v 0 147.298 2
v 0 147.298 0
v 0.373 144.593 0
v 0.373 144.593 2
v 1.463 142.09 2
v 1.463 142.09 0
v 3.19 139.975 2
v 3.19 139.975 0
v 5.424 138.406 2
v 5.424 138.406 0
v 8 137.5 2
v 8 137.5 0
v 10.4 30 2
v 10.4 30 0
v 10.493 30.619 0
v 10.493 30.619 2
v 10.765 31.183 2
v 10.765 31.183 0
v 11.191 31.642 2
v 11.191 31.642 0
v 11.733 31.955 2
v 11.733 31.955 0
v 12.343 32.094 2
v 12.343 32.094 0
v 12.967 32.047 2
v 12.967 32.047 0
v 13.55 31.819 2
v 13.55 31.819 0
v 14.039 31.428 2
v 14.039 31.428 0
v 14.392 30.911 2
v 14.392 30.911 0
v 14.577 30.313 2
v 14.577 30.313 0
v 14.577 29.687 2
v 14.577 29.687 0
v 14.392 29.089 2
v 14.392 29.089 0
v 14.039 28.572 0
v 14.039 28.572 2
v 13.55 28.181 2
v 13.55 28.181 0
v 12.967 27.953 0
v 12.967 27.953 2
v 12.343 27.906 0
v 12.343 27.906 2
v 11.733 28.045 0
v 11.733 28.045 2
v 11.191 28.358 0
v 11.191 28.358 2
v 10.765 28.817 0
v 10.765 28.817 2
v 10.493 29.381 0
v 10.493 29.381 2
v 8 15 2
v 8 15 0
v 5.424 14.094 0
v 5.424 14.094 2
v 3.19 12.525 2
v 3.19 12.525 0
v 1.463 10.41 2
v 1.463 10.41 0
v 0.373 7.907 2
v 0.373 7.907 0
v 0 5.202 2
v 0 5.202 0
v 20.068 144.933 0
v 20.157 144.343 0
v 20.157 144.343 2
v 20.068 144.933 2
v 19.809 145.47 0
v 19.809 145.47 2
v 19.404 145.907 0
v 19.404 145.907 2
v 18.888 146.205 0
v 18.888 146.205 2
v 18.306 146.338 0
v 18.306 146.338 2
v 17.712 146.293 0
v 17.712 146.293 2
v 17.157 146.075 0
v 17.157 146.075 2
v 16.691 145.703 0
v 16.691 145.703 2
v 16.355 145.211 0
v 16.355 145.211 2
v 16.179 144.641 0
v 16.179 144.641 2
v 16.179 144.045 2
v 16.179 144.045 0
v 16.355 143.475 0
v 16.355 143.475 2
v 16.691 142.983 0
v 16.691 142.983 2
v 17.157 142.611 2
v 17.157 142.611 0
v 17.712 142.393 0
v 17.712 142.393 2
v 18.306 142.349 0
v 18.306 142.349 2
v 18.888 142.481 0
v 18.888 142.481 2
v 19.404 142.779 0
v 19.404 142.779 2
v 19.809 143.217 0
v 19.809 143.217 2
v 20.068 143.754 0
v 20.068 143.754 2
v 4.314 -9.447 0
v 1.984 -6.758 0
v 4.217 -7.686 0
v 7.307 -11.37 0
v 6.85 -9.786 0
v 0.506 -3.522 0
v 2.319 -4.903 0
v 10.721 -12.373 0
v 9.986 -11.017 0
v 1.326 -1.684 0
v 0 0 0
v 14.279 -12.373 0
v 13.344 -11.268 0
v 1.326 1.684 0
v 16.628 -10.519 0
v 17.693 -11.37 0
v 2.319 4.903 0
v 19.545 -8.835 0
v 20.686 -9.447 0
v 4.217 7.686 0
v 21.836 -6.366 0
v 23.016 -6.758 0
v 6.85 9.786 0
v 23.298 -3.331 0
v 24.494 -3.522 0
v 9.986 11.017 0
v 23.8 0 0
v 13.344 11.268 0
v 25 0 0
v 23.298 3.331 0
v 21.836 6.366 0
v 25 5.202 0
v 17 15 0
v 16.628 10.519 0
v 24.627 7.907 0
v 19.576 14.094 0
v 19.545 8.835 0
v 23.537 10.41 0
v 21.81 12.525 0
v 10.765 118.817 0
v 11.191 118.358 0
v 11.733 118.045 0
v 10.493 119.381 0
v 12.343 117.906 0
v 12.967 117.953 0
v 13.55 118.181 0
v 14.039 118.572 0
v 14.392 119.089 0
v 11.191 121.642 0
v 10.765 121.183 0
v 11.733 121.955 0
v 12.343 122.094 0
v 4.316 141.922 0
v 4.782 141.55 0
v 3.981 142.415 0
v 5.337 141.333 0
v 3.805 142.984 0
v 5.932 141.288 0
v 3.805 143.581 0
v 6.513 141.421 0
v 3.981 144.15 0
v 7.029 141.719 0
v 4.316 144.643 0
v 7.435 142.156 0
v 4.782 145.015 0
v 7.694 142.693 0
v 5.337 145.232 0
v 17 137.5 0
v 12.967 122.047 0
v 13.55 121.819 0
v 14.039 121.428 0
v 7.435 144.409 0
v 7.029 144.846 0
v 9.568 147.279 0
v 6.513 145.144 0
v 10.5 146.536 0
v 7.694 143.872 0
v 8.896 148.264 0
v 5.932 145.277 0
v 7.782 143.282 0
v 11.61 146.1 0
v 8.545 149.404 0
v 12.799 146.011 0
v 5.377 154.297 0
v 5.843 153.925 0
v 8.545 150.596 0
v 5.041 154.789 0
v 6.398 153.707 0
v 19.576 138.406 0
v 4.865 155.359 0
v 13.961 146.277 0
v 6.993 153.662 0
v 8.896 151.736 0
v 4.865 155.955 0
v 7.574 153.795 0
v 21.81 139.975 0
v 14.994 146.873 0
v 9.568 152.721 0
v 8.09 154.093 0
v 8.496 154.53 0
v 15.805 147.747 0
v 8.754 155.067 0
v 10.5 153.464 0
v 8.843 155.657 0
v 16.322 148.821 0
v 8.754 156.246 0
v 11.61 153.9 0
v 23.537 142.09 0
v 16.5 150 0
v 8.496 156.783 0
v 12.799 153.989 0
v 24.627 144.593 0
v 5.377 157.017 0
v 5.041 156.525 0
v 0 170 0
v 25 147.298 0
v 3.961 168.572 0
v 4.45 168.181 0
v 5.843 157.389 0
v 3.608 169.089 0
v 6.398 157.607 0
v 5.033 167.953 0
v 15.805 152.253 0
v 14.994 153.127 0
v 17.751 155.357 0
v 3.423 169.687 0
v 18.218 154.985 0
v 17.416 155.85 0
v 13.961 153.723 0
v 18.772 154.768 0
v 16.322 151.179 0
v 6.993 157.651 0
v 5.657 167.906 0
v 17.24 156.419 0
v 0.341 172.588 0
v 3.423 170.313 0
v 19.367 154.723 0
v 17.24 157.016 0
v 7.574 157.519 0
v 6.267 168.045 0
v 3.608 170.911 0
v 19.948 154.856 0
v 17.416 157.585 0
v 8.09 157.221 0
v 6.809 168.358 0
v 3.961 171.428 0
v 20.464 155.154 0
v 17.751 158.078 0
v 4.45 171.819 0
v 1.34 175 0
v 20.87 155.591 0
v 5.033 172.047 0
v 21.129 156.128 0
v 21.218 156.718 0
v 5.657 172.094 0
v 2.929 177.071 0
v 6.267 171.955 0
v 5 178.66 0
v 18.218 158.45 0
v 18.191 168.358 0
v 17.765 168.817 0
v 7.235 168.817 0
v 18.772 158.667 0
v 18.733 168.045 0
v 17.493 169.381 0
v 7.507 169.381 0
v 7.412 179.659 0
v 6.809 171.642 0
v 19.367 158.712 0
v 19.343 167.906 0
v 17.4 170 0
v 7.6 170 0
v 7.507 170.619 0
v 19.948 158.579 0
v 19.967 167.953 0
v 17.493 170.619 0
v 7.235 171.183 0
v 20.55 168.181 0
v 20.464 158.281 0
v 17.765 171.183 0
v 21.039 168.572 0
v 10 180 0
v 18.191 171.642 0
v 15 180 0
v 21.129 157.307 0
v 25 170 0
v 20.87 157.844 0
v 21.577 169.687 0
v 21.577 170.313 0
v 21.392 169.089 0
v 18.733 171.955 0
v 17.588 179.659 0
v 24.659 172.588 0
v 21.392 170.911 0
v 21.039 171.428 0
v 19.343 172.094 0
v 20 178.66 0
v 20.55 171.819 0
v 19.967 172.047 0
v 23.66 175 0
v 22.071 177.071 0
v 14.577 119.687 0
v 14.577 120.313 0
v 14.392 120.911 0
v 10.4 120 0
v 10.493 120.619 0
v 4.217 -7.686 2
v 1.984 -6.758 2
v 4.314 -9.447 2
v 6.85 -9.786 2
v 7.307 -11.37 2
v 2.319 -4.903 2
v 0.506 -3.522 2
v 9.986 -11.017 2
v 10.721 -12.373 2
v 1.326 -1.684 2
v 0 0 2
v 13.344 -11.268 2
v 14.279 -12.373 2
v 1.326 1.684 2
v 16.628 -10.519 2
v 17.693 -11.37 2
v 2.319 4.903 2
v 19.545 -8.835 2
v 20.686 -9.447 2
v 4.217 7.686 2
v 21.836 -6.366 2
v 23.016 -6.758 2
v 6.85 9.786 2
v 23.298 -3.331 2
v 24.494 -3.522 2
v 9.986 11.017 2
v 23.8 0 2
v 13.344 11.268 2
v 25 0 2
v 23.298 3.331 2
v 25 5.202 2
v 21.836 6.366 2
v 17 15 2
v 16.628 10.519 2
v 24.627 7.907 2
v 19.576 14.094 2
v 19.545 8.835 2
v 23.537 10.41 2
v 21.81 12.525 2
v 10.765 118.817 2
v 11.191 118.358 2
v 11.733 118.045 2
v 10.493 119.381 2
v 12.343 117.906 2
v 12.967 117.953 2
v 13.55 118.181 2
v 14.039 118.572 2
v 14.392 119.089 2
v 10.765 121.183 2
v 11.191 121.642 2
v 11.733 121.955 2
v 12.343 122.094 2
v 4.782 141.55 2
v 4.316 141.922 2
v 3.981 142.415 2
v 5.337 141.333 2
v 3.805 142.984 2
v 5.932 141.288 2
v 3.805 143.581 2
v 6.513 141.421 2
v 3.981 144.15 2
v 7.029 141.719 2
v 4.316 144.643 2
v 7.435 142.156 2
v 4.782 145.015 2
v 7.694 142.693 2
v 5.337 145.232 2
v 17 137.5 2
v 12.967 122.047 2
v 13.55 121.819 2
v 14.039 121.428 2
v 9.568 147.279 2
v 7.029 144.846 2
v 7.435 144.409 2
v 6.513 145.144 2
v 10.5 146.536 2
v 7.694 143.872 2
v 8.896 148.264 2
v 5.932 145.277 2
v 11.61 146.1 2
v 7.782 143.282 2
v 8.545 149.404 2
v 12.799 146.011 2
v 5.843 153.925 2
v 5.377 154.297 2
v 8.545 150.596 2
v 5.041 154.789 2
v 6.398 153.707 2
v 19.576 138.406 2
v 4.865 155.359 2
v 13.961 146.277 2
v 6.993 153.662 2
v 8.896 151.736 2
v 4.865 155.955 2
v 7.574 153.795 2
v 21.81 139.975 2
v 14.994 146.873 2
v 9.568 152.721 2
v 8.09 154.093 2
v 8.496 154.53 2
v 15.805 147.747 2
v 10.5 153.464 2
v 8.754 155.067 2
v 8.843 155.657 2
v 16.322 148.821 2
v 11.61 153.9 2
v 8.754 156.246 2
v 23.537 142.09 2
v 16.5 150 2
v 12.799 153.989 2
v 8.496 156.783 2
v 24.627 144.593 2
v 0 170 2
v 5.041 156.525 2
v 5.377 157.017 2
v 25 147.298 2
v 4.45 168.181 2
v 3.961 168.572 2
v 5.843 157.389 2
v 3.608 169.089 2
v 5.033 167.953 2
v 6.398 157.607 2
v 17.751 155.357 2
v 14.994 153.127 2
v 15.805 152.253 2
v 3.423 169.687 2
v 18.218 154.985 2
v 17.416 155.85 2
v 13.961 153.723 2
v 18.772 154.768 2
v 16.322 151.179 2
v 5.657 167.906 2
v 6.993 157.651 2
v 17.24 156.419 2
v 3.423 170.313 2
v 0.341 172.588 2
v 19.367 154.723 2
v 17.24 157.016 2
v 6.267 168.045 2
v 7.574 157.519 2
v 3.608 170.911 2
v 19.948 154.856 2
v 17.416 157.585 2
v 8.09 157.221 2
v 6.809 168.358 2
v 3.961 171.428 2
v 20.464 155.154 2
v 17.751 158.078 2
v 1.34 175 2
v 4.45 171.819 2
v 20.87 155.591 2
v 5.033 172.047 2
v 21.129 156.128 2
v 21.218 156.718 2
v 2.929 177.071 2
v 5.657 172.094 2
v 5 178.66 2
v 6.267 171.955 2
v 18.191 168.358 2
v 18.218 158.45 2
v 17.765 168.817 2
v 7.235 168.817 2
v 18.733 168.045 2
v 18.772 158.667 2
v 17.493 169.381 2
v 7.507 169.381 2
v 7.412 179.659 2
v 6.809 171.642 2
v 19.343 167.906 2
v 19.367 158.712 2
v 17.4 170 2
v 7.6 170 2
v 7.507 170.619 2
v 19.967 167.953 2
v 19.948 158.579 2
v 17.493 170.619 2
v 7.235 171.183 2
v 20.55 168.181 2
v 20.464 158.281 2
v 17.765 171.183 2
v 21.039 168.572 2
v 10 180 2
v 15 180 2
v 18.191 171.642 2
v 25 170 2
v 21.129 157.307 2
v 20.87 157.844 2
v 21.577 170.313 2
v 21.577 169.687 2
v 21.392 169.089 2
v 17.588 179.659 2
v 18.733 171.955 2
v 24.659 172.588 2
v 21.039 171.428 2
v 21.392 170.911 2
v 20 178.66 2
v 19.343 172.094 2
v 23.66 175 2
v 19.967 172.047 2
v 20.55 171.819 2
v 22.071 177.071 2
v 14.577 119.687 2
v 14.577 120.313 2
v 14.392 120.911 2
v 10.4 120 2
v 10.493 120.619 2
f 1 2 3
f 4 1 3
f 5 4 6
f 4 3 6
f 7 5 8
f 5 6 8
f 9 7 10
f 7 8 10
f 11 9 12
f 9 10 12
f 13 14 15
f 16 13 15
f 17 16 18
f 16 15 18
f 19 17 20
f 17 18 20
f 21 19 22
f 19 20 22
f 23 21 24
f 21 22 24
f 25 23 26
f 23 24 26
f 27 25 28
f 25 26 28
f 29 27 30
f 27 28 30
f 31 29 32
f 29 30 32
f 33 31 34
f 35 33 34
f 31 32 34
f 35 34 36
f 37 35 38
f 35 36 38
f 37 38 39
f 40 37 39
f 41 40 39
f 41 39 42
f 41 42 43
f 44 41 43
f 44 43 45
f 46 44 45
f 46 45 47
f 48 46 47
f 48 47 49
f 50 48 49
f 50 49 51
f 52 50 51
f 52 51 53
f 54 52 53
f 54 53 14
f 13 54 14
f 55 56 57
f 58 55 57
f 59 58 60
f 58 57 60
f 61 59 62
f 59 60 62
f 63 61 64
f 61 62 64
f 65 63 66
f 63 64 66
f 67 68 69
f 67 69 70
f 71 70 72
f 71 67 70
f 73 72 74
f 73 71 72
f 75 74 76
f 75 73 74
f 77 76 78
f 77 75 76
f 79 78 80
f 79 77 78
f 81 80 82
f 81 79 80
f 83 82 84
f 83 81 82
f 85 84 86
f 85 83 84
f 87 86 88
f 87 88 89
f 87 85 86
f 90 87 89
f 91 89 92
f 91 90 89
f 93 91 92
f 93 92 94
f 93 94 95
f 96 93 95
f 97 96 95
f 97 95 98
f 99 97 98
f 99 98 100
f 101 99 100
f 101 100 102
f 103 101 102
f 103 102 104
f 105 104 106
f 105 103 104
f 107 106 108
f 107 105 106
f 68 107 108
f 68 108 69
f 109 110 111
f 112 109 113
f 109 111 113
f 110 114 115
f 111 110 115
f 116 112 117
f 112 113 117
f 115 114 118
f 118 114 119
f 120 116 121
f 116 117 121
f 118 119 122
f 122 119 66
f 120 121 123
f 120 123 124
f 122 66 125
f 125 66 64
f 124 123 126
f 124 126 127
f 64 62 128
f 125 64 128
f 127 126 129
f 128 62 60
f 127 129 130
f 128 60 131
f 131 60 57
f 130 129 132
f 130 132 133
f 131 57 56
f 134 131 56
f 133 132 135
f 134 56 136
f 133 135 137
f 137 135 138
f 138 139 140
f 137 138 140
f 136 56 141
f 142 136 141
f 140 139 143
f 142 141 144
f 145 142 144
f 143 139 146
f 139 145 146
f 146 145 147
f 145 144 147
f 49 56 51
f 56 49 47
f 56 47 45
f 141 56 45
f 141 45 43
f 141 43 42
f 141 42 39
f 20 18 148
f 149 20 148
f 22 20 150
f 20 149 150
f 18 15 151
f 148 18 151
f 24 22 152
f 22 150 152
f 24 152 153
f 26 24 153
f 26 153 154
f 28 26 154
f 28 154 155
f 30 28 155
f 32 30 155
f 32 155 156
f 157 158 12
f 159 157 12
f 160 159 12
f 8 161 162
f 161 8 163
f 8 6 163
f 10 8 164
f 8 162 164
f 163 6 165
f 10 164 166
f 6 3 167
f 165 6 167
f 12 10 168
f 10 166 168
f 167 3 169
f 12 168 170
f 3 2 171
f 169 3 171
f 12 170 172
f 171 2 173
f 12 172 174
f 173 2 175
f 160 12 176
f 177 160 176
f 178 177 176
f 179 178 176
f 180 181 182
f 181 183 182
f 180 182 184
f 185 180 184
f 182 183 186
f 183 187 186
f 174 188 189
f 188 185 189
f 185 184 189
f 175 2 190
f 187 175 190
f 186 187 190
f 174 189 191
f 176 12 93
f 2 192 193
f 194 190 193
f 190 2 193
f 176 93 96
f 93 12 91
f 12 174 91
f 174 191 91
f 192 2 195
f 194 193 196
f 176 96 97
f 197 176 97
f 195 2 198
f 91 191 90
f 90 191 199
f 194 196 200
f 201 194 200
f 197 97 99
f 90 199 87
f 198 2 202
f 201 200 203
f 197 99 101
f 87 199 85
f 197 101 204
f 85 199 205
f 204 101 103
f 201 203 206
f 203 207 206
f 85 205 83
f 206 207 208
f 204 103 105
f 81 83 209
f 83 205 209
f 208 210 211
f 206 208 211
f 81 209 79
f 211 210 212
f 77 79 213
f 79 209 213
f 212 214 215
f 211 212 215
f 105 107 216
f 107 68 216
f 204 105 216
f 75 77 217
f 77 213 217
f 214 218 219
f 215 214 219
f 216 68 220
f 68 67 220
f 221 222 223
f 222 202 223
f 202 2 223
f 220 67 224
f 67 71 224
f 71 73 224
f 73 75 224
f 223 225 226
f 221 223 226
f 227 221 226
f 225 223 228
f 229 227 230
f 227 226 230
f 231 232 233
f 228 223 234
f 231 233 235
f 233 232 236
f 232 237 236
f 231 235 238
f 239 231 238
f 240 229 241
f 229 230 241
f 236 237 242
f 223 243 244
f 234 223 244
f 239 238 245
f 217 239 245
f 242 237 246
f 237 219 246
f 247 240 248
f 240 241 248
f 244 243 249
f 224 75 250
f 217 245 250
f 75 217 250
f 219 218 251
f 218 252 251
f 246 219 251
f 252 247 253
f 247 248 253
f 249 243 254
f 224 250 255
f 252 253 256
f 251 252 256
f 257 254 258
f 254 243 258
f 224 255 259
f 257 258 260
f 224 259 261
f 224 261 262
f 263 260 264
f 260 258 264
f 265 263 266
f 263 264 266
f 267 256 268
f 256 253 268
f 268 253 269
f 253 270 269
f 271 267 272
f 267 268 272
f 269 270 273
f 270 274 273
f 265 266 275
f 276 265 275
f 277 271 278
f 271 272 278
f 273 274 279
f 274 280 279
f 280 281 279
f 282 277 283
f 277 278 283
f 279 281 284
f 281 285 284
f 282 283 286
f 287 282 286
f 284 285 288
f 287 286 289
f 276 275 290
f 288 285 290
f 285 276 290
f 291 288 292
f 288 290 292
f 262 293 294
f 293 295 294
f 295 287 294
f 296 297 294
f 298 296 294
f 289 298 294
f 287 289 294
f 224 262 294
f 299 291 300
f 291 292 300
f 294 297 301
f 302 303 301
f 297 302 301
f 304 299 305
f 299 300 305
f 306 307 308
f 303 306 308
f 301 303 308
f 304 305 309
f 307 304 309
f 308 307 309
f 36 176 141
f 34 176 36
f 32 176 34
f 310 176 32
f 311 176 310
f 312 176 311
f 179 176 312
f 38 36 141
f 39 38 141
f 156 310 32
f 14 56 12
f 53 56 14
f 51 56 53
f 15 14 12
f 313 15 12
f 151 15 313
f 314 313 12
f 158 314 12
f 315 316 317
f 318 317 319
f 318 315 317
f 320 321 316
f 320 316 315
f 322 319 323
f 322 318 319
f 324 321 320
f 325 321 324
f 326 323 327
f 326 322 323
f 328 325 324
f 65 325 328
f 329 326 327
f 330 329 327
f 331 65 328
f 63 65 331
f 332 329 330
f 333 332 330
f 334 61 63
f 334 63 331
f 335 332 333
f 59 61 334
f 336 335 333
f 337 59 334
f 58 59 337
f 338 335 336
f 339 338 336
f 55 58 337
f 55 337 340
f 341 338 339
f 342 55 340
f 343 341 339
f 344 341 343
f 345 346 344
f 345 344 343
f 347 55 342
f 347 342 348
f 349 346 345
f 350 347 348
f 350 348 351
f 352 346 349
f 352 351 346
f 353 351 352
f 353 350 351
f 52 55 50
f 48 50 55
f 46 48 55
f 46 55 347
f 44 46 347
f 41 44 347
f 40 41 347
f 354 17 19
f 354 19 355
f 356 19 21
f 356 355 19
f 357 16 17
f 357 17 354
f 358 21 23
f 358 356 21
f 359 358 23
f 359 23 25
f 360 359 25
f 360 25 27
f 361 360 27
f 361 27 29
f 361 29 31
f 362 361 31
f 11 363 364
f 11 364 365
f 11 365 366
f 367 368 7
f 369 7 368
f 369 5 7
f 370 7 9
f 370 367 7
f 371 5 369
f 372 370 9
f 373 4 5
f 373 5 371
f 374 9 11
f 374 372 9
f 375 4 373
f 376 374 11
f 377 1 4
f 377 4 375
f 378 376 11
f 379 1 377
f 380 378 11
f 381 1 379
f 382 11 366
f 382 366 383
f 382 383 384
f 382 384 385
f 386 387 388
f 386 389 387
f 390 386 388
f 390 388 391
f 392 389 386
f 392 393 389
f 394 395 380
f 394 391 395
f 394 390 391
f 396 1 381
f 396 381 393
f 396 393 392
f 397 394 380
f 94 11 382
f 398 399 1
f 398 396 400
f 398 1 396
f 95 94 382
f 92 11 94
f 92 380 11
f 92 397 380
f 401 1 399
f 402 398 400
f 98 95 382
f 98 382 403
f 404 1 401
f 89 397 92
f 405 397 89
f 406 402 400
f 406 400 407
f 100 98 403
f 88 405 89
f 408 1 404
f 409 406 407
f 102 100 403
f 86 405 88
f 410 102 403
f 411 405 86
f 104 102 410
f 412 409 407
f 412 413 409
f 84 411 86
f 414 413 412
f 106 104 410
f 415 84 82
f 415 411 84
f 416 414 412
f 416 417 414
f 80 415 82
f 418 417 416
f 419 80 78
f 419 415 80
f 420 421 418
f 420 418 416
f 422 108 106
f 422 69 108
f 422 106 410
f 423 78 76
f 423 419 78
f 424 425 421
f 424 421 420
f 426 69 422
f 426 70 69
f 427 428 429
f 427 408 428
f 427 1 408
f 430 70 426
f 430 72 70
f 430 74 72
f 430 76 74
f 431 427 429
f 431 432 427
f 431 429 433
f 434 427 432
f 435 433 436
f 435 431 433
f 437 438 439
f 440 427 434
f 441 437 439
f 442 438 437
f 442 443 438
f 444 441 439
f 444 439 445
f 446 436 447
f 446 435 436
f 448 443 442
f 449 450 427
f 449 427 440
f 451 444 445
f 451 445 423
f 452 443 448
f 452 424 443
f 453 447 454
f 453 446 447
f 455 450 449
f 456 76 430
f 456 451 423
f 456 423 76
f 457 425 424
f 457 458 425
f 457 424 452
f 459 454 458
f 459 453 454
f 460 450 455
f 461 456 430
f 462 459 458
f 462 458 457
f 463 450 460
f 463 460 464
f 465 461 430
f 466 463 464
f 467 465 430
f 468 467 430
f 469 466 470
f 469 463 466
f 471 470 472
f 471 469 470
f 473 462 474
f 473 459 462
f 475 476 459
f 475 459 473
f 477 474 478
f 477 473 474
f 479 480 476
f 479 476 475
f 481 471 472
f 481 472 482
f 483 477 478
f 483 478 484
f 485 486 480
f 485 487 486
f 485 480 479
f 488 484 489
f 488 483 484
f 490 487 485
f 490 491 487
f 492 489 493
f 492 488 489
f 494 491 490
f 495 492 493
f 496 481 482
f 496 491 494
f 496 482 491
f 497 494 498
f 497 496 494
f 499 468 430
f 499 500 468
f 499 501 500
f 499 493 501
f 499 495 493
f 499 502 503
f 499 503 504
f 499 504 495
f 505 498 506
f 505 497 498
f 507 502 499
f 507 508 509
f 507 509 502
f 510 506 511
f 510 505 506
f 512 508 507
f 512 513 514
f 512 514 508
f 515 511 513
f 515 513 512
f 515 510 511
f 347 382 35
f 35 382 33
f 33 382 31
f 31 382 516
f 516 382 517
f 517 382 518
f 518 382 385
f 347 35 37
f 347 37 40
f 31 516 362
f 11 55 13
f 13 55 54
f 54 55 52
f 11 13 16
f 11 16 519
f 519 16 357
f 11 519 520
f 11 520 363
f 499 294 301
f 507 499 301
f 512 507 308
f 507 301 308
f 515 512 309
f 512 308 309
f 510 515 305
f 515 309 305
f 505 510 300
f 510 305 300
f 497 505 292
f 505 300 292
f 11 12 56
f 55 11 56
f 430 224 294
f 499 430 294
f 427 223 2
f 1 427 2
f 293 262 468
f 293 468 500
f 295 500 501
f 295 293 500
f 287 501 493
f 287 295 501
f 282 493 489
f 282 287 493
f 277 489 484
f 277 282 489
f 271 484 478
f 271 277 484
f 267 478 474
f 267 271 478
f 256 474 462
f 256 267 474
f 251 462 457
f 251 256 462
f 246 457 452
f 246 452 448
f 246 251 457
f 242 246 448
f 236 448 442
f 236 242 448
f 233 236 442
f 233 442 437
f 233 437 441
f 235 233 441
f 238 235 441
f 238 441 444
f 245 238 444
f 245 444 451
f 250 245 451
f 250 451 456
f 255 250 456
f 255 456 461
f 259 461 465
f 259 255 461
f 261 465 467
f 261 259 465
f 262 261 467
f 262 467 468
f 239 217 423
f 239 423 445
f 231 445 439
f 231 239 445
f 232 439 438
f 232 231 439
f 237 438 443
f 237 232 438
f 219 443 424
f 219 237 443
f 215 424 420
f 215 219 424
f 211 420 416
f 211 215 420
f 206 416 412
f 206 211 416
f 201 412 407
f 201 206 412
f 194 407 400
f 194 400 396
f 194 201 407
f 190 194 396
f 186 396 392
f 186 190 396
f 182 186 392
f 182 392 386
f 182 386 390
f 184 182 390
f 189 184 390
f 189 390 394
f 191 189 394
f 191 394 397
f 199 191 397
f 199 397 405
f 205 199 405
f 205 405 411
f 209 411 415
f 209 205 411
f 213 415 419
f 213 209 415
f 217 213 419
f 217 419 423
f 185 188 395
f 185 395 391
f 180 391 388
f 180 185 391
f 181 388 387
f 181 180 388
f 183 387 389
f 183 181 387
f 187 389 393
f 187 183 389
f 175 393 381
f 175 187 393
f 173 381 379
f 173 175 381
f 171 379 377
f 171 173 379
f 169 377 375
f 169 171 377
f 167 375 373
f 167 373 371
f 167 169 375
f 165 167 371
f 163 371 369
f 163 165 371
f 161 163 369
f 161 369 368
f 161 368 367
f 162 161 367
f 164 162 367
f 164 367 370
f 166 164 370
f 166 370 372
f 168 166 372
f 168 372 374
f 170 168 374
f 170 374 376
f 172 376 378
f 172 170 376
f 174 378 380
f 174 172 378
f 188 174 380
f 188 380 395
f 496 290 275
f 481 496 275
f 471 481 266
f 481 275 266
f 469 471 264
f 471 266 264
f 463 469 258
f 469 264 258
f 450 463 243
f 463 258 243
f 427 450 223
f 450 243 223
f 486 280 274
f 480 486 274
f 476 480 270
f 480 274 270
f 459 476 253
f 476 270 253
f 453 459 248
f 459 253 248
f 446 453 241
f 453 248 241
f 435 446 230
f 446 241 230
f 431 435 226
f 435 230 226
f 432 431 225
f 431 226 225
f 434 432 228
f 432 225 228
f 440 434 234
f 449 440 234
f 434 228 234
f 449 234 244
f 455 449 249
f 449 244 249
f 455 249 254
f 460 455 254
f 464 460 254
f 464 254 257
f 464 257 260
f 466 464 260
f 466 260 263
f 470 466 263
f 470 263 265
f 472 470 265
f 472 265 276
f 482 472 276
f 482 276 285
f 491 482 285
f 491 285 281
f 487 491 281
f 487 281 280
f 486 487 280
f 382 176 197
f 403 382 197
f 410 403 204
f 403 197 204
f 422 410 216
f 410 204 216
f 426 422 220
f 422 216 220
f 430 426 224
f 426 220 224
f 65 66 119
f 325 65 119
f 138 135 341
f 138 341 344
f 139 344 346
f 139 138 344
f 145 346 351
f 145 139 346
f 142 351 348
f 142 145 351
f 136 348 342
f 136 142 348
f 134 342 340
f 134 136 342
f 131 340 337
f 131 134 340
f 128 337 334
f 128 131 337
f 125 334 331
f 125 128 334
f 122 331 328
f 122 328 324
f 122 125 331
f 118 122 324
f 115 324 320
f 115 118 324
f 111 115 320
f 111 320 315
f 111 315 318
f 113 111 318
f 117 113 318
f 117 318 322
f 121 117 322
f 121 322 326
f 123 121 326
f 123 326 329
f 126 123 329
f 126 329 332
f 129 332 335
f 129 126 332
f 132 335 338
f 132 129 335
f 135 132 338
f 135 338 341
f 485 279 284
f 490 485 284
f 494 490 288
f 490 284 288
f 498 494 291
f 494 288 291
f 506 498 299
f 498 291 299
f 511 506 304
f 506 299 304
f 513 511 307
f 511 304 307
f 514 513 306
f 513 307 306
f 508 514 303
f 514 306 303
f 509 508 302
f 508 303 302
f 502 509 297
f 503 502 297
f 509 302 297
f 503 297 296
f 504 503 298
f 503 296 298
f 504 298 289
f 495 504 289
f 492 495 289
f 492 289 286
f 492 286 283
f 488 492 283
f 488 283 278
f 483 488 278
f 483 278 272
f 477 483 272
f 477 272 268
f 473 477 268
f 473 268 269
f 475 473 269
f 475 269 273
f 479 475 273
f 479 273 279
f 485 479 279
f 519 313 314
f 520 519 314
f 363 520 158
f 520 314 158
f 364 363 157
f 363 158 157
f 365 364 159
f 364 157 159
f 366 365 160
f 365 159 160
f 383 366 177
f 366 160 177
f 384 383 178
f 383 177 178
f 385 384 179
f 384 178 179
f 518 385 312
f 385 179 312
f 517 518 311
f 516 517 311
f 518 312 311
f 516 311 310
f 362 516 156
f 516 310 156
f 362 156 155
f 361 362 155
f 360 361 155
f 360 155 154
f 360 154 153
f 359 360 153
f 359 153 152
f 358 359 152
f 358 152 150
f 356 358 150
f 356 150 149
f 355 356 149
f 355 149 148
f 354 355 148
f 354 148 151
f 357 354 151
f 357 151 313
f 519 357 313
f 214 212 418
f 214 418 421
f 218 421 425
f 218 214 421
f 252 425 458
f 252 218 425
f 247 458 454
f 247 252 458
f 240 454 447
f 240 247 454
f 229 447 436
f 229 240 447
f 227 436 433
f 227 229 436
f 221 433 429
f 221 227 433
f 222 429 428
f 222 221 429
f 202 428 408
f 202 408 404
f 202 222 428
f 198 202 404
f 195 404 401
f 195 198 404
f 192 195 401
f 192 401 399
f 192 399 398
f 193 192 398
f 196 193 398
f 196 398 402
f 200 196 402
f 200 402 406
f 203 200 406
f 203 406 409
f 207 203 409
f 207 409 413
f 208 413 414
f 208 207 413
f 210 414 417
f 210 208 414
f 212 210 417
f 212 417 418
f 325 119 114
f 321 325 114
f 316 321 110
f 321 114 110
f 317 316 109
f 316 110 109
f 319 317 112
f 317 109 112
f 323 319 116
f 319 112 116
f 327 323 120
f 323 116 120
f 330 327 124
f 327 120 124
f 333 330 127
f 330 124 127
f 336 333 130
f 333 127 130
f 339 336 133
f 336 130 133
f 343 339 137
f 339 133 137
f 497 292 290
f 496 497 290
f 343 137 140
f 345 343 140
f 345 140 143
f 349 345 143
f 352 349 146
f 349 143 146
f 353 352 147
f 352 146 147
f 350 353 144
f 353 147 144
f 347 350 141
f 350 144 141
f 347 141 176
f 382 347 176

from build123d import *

# Parameters (mm, degrees)
SKETCH1_R           = 11.3
SKETCH1_R_2         = 4
SKETCH1_R_3         = 2
BOSS_EXTRUDE1_DEPTH = 2
FILLET1_R           = 10
SKETCH2_R           = 2.1
CUT_EXTRUDE1_DEPTH  = 182.73882359


with BuildPart() as part:
    # Sketch1 → Boss-Extrude1 (new body)
    with BuildSketch(Plane.XY):
        with BuildLine():
            ThreePointArc((0, 0), (12.5, -12.5), (25, 0))
            Line((25, 0), (25, 15))
            Line((25, 15), (17, 15))
            Line((17, 15), (17, 137.5))
            Line((17, 137.5), (25, 137.5))
            Line((25, 137.5), (25, 180))
            Line((25, 180), (0, 180))
            Line((0, 180), (0, 137.5))
            Line((0, 137.5), (8, 137.5))
            Line((8, 137.5), (8, 15))
            Line((8, 15), (0, 15))
            Line((0, 15), (0, 0))
        make_face()
        with Locations((12.5, 0)):
            Circle(SKETCH1_R, mode=Mode.SUBTRACT)
        with Locations((12.5, 150)):
            Circle(SKETCH1_R_2, mode=Mode.SUBTRACT)
        with Locations((18.156854249, 144.343145751)):
            Circle(SKETCH1_R_3, mode=Mode.SUBTRACT)
        with Locations((5.782485579, 143.282485579)):
            Circle(SKETCH1_R_3, mode=Mode.SUBTRACT)
        with Locations((19.217514421, 156.717514421)):
            Circle(SKETCH1_R_3, mode=Mode.SUBTRACT)
        with Locations((6.843145751, 155.656854249)):
            Circle(SKETCH1_R_3, mode=Mode.SUBTRACT)
    extrude(amount=BOSS_EXTRUDE1_DEPTH)

    # Fillet1
    # the kernel refuses this fillet: 10 mm, written as the material it takes off along each edge
    with BuildSketch(Plane(origin=(25, 15, -24.494897428), x_dir=(0, -1, 0), z_dir=(0, 0, 1)), Plane(origin=(0, 137.5, -24.494897428), x_dir=(0, 1, 0), z_dir=(0, 0, 1))) as fillet1_piece_1:
        with BuildLine():
            CenterArc((9.797958971, -10), FILLET1_R, 90, 78.463040967)
            Line((0, -8), (-0.195959179, -7.96))
            ThreePointArc((-0.195959179, -7.96), (-0.2, -4), (-0.2, 0))
            Line((-0.2, 0), (0, 0.2))
            Line((0, 0.2), (9.797958971, 0.2))
            Line((9.797958971, 0.2), (9.797958971, 0))
        make_face()
    extrude(amount=50.989794856, mode=Mode.SUBTRACT)
    with BuildSketch(Plane(origin=(0, 15, -24.494897428), x_dir=(1, 0, 0), z_dir=(0, 0, 1)), Plane(origin=(25, 137.5, -24.494897428), x_dir=(-1, 0, 0), z_dir=(0, 0, 1))) as fillet1_piece_2:
        with BuildLine():
            CenterArc((10, -9.797958971), FILLET1_R, 101.536959033, 78.463040967)
            Line((0, -9.797958971), (-0.2, -9.797958971))
            Line((-0.2, -9.797958971), (-0.2, 0))
            Line((-0.2, 0), (0, 0.2))
            ThreePointArc((0, 0.2), (4, 0.2), (7.96, 0.195959179))
            Line((7.96, 0.195959179), (8, 0))
        make_face()
    extrude(amount=50.989794856, mode=Mode.SUBTRACT)
    with BuildSketch(Plane(origin=(0, 180, -25), x_dir=(1, 0, 0), z_dir=(0, 0, 1)), Plane(origin=(25, 180, -25), x_dir=(0, -1, 0), z_dir=(0, 0, 1))) as fillet1_piece_3:
        with BuildLine():
            CenterArc((FILLET1_R, -FILLET1_R), FILLET1_R, 90, 90)
            Line((0, -FILLET1_R), (-FILLET1_R * 0.02, -FILLET1_R))
            Line((-FILLET1_R * 0.02, -FILLET1_R), (-FILLET1_R * 0.02, FILLET1_R * 0.02))
            Line((-FILLET1_R * 0.02, FILLET1_R * 0.02), (FILLET1_R, FILLET1_R * 0.02))
            Line((FILLET1_R, FILLET1_R * 0.02), (FILLET1_R, 0))
        make_face()
    extrude(amount=52, mode=Mode.SUBTRACT)

    # Sketch2 → Cut-Extrude1 (cut, through all)
    with BuildSketch(Plane(origin=(0, 0, 0), x_dir=(-1, 0, 0), z_dir=(0, 0, -1))):
        with Locations((-12.5, 120)):
            Circle(SKETCH2_R)
        with Locations((-12.5, 30)):
            Circle(SKETCH2_R)
        with Locations((-19.5, 170)):
            Circle(SKETCH2_R)
        with Locations(Location((-5.5, 170, 0), (0, 0, 180))):
            Circle(SKETCH2_R)
    extrude(amount=-CUT_EXTRUDE1_DEPTH, mode=Mode.SUBTRACT)


solid = part.part
